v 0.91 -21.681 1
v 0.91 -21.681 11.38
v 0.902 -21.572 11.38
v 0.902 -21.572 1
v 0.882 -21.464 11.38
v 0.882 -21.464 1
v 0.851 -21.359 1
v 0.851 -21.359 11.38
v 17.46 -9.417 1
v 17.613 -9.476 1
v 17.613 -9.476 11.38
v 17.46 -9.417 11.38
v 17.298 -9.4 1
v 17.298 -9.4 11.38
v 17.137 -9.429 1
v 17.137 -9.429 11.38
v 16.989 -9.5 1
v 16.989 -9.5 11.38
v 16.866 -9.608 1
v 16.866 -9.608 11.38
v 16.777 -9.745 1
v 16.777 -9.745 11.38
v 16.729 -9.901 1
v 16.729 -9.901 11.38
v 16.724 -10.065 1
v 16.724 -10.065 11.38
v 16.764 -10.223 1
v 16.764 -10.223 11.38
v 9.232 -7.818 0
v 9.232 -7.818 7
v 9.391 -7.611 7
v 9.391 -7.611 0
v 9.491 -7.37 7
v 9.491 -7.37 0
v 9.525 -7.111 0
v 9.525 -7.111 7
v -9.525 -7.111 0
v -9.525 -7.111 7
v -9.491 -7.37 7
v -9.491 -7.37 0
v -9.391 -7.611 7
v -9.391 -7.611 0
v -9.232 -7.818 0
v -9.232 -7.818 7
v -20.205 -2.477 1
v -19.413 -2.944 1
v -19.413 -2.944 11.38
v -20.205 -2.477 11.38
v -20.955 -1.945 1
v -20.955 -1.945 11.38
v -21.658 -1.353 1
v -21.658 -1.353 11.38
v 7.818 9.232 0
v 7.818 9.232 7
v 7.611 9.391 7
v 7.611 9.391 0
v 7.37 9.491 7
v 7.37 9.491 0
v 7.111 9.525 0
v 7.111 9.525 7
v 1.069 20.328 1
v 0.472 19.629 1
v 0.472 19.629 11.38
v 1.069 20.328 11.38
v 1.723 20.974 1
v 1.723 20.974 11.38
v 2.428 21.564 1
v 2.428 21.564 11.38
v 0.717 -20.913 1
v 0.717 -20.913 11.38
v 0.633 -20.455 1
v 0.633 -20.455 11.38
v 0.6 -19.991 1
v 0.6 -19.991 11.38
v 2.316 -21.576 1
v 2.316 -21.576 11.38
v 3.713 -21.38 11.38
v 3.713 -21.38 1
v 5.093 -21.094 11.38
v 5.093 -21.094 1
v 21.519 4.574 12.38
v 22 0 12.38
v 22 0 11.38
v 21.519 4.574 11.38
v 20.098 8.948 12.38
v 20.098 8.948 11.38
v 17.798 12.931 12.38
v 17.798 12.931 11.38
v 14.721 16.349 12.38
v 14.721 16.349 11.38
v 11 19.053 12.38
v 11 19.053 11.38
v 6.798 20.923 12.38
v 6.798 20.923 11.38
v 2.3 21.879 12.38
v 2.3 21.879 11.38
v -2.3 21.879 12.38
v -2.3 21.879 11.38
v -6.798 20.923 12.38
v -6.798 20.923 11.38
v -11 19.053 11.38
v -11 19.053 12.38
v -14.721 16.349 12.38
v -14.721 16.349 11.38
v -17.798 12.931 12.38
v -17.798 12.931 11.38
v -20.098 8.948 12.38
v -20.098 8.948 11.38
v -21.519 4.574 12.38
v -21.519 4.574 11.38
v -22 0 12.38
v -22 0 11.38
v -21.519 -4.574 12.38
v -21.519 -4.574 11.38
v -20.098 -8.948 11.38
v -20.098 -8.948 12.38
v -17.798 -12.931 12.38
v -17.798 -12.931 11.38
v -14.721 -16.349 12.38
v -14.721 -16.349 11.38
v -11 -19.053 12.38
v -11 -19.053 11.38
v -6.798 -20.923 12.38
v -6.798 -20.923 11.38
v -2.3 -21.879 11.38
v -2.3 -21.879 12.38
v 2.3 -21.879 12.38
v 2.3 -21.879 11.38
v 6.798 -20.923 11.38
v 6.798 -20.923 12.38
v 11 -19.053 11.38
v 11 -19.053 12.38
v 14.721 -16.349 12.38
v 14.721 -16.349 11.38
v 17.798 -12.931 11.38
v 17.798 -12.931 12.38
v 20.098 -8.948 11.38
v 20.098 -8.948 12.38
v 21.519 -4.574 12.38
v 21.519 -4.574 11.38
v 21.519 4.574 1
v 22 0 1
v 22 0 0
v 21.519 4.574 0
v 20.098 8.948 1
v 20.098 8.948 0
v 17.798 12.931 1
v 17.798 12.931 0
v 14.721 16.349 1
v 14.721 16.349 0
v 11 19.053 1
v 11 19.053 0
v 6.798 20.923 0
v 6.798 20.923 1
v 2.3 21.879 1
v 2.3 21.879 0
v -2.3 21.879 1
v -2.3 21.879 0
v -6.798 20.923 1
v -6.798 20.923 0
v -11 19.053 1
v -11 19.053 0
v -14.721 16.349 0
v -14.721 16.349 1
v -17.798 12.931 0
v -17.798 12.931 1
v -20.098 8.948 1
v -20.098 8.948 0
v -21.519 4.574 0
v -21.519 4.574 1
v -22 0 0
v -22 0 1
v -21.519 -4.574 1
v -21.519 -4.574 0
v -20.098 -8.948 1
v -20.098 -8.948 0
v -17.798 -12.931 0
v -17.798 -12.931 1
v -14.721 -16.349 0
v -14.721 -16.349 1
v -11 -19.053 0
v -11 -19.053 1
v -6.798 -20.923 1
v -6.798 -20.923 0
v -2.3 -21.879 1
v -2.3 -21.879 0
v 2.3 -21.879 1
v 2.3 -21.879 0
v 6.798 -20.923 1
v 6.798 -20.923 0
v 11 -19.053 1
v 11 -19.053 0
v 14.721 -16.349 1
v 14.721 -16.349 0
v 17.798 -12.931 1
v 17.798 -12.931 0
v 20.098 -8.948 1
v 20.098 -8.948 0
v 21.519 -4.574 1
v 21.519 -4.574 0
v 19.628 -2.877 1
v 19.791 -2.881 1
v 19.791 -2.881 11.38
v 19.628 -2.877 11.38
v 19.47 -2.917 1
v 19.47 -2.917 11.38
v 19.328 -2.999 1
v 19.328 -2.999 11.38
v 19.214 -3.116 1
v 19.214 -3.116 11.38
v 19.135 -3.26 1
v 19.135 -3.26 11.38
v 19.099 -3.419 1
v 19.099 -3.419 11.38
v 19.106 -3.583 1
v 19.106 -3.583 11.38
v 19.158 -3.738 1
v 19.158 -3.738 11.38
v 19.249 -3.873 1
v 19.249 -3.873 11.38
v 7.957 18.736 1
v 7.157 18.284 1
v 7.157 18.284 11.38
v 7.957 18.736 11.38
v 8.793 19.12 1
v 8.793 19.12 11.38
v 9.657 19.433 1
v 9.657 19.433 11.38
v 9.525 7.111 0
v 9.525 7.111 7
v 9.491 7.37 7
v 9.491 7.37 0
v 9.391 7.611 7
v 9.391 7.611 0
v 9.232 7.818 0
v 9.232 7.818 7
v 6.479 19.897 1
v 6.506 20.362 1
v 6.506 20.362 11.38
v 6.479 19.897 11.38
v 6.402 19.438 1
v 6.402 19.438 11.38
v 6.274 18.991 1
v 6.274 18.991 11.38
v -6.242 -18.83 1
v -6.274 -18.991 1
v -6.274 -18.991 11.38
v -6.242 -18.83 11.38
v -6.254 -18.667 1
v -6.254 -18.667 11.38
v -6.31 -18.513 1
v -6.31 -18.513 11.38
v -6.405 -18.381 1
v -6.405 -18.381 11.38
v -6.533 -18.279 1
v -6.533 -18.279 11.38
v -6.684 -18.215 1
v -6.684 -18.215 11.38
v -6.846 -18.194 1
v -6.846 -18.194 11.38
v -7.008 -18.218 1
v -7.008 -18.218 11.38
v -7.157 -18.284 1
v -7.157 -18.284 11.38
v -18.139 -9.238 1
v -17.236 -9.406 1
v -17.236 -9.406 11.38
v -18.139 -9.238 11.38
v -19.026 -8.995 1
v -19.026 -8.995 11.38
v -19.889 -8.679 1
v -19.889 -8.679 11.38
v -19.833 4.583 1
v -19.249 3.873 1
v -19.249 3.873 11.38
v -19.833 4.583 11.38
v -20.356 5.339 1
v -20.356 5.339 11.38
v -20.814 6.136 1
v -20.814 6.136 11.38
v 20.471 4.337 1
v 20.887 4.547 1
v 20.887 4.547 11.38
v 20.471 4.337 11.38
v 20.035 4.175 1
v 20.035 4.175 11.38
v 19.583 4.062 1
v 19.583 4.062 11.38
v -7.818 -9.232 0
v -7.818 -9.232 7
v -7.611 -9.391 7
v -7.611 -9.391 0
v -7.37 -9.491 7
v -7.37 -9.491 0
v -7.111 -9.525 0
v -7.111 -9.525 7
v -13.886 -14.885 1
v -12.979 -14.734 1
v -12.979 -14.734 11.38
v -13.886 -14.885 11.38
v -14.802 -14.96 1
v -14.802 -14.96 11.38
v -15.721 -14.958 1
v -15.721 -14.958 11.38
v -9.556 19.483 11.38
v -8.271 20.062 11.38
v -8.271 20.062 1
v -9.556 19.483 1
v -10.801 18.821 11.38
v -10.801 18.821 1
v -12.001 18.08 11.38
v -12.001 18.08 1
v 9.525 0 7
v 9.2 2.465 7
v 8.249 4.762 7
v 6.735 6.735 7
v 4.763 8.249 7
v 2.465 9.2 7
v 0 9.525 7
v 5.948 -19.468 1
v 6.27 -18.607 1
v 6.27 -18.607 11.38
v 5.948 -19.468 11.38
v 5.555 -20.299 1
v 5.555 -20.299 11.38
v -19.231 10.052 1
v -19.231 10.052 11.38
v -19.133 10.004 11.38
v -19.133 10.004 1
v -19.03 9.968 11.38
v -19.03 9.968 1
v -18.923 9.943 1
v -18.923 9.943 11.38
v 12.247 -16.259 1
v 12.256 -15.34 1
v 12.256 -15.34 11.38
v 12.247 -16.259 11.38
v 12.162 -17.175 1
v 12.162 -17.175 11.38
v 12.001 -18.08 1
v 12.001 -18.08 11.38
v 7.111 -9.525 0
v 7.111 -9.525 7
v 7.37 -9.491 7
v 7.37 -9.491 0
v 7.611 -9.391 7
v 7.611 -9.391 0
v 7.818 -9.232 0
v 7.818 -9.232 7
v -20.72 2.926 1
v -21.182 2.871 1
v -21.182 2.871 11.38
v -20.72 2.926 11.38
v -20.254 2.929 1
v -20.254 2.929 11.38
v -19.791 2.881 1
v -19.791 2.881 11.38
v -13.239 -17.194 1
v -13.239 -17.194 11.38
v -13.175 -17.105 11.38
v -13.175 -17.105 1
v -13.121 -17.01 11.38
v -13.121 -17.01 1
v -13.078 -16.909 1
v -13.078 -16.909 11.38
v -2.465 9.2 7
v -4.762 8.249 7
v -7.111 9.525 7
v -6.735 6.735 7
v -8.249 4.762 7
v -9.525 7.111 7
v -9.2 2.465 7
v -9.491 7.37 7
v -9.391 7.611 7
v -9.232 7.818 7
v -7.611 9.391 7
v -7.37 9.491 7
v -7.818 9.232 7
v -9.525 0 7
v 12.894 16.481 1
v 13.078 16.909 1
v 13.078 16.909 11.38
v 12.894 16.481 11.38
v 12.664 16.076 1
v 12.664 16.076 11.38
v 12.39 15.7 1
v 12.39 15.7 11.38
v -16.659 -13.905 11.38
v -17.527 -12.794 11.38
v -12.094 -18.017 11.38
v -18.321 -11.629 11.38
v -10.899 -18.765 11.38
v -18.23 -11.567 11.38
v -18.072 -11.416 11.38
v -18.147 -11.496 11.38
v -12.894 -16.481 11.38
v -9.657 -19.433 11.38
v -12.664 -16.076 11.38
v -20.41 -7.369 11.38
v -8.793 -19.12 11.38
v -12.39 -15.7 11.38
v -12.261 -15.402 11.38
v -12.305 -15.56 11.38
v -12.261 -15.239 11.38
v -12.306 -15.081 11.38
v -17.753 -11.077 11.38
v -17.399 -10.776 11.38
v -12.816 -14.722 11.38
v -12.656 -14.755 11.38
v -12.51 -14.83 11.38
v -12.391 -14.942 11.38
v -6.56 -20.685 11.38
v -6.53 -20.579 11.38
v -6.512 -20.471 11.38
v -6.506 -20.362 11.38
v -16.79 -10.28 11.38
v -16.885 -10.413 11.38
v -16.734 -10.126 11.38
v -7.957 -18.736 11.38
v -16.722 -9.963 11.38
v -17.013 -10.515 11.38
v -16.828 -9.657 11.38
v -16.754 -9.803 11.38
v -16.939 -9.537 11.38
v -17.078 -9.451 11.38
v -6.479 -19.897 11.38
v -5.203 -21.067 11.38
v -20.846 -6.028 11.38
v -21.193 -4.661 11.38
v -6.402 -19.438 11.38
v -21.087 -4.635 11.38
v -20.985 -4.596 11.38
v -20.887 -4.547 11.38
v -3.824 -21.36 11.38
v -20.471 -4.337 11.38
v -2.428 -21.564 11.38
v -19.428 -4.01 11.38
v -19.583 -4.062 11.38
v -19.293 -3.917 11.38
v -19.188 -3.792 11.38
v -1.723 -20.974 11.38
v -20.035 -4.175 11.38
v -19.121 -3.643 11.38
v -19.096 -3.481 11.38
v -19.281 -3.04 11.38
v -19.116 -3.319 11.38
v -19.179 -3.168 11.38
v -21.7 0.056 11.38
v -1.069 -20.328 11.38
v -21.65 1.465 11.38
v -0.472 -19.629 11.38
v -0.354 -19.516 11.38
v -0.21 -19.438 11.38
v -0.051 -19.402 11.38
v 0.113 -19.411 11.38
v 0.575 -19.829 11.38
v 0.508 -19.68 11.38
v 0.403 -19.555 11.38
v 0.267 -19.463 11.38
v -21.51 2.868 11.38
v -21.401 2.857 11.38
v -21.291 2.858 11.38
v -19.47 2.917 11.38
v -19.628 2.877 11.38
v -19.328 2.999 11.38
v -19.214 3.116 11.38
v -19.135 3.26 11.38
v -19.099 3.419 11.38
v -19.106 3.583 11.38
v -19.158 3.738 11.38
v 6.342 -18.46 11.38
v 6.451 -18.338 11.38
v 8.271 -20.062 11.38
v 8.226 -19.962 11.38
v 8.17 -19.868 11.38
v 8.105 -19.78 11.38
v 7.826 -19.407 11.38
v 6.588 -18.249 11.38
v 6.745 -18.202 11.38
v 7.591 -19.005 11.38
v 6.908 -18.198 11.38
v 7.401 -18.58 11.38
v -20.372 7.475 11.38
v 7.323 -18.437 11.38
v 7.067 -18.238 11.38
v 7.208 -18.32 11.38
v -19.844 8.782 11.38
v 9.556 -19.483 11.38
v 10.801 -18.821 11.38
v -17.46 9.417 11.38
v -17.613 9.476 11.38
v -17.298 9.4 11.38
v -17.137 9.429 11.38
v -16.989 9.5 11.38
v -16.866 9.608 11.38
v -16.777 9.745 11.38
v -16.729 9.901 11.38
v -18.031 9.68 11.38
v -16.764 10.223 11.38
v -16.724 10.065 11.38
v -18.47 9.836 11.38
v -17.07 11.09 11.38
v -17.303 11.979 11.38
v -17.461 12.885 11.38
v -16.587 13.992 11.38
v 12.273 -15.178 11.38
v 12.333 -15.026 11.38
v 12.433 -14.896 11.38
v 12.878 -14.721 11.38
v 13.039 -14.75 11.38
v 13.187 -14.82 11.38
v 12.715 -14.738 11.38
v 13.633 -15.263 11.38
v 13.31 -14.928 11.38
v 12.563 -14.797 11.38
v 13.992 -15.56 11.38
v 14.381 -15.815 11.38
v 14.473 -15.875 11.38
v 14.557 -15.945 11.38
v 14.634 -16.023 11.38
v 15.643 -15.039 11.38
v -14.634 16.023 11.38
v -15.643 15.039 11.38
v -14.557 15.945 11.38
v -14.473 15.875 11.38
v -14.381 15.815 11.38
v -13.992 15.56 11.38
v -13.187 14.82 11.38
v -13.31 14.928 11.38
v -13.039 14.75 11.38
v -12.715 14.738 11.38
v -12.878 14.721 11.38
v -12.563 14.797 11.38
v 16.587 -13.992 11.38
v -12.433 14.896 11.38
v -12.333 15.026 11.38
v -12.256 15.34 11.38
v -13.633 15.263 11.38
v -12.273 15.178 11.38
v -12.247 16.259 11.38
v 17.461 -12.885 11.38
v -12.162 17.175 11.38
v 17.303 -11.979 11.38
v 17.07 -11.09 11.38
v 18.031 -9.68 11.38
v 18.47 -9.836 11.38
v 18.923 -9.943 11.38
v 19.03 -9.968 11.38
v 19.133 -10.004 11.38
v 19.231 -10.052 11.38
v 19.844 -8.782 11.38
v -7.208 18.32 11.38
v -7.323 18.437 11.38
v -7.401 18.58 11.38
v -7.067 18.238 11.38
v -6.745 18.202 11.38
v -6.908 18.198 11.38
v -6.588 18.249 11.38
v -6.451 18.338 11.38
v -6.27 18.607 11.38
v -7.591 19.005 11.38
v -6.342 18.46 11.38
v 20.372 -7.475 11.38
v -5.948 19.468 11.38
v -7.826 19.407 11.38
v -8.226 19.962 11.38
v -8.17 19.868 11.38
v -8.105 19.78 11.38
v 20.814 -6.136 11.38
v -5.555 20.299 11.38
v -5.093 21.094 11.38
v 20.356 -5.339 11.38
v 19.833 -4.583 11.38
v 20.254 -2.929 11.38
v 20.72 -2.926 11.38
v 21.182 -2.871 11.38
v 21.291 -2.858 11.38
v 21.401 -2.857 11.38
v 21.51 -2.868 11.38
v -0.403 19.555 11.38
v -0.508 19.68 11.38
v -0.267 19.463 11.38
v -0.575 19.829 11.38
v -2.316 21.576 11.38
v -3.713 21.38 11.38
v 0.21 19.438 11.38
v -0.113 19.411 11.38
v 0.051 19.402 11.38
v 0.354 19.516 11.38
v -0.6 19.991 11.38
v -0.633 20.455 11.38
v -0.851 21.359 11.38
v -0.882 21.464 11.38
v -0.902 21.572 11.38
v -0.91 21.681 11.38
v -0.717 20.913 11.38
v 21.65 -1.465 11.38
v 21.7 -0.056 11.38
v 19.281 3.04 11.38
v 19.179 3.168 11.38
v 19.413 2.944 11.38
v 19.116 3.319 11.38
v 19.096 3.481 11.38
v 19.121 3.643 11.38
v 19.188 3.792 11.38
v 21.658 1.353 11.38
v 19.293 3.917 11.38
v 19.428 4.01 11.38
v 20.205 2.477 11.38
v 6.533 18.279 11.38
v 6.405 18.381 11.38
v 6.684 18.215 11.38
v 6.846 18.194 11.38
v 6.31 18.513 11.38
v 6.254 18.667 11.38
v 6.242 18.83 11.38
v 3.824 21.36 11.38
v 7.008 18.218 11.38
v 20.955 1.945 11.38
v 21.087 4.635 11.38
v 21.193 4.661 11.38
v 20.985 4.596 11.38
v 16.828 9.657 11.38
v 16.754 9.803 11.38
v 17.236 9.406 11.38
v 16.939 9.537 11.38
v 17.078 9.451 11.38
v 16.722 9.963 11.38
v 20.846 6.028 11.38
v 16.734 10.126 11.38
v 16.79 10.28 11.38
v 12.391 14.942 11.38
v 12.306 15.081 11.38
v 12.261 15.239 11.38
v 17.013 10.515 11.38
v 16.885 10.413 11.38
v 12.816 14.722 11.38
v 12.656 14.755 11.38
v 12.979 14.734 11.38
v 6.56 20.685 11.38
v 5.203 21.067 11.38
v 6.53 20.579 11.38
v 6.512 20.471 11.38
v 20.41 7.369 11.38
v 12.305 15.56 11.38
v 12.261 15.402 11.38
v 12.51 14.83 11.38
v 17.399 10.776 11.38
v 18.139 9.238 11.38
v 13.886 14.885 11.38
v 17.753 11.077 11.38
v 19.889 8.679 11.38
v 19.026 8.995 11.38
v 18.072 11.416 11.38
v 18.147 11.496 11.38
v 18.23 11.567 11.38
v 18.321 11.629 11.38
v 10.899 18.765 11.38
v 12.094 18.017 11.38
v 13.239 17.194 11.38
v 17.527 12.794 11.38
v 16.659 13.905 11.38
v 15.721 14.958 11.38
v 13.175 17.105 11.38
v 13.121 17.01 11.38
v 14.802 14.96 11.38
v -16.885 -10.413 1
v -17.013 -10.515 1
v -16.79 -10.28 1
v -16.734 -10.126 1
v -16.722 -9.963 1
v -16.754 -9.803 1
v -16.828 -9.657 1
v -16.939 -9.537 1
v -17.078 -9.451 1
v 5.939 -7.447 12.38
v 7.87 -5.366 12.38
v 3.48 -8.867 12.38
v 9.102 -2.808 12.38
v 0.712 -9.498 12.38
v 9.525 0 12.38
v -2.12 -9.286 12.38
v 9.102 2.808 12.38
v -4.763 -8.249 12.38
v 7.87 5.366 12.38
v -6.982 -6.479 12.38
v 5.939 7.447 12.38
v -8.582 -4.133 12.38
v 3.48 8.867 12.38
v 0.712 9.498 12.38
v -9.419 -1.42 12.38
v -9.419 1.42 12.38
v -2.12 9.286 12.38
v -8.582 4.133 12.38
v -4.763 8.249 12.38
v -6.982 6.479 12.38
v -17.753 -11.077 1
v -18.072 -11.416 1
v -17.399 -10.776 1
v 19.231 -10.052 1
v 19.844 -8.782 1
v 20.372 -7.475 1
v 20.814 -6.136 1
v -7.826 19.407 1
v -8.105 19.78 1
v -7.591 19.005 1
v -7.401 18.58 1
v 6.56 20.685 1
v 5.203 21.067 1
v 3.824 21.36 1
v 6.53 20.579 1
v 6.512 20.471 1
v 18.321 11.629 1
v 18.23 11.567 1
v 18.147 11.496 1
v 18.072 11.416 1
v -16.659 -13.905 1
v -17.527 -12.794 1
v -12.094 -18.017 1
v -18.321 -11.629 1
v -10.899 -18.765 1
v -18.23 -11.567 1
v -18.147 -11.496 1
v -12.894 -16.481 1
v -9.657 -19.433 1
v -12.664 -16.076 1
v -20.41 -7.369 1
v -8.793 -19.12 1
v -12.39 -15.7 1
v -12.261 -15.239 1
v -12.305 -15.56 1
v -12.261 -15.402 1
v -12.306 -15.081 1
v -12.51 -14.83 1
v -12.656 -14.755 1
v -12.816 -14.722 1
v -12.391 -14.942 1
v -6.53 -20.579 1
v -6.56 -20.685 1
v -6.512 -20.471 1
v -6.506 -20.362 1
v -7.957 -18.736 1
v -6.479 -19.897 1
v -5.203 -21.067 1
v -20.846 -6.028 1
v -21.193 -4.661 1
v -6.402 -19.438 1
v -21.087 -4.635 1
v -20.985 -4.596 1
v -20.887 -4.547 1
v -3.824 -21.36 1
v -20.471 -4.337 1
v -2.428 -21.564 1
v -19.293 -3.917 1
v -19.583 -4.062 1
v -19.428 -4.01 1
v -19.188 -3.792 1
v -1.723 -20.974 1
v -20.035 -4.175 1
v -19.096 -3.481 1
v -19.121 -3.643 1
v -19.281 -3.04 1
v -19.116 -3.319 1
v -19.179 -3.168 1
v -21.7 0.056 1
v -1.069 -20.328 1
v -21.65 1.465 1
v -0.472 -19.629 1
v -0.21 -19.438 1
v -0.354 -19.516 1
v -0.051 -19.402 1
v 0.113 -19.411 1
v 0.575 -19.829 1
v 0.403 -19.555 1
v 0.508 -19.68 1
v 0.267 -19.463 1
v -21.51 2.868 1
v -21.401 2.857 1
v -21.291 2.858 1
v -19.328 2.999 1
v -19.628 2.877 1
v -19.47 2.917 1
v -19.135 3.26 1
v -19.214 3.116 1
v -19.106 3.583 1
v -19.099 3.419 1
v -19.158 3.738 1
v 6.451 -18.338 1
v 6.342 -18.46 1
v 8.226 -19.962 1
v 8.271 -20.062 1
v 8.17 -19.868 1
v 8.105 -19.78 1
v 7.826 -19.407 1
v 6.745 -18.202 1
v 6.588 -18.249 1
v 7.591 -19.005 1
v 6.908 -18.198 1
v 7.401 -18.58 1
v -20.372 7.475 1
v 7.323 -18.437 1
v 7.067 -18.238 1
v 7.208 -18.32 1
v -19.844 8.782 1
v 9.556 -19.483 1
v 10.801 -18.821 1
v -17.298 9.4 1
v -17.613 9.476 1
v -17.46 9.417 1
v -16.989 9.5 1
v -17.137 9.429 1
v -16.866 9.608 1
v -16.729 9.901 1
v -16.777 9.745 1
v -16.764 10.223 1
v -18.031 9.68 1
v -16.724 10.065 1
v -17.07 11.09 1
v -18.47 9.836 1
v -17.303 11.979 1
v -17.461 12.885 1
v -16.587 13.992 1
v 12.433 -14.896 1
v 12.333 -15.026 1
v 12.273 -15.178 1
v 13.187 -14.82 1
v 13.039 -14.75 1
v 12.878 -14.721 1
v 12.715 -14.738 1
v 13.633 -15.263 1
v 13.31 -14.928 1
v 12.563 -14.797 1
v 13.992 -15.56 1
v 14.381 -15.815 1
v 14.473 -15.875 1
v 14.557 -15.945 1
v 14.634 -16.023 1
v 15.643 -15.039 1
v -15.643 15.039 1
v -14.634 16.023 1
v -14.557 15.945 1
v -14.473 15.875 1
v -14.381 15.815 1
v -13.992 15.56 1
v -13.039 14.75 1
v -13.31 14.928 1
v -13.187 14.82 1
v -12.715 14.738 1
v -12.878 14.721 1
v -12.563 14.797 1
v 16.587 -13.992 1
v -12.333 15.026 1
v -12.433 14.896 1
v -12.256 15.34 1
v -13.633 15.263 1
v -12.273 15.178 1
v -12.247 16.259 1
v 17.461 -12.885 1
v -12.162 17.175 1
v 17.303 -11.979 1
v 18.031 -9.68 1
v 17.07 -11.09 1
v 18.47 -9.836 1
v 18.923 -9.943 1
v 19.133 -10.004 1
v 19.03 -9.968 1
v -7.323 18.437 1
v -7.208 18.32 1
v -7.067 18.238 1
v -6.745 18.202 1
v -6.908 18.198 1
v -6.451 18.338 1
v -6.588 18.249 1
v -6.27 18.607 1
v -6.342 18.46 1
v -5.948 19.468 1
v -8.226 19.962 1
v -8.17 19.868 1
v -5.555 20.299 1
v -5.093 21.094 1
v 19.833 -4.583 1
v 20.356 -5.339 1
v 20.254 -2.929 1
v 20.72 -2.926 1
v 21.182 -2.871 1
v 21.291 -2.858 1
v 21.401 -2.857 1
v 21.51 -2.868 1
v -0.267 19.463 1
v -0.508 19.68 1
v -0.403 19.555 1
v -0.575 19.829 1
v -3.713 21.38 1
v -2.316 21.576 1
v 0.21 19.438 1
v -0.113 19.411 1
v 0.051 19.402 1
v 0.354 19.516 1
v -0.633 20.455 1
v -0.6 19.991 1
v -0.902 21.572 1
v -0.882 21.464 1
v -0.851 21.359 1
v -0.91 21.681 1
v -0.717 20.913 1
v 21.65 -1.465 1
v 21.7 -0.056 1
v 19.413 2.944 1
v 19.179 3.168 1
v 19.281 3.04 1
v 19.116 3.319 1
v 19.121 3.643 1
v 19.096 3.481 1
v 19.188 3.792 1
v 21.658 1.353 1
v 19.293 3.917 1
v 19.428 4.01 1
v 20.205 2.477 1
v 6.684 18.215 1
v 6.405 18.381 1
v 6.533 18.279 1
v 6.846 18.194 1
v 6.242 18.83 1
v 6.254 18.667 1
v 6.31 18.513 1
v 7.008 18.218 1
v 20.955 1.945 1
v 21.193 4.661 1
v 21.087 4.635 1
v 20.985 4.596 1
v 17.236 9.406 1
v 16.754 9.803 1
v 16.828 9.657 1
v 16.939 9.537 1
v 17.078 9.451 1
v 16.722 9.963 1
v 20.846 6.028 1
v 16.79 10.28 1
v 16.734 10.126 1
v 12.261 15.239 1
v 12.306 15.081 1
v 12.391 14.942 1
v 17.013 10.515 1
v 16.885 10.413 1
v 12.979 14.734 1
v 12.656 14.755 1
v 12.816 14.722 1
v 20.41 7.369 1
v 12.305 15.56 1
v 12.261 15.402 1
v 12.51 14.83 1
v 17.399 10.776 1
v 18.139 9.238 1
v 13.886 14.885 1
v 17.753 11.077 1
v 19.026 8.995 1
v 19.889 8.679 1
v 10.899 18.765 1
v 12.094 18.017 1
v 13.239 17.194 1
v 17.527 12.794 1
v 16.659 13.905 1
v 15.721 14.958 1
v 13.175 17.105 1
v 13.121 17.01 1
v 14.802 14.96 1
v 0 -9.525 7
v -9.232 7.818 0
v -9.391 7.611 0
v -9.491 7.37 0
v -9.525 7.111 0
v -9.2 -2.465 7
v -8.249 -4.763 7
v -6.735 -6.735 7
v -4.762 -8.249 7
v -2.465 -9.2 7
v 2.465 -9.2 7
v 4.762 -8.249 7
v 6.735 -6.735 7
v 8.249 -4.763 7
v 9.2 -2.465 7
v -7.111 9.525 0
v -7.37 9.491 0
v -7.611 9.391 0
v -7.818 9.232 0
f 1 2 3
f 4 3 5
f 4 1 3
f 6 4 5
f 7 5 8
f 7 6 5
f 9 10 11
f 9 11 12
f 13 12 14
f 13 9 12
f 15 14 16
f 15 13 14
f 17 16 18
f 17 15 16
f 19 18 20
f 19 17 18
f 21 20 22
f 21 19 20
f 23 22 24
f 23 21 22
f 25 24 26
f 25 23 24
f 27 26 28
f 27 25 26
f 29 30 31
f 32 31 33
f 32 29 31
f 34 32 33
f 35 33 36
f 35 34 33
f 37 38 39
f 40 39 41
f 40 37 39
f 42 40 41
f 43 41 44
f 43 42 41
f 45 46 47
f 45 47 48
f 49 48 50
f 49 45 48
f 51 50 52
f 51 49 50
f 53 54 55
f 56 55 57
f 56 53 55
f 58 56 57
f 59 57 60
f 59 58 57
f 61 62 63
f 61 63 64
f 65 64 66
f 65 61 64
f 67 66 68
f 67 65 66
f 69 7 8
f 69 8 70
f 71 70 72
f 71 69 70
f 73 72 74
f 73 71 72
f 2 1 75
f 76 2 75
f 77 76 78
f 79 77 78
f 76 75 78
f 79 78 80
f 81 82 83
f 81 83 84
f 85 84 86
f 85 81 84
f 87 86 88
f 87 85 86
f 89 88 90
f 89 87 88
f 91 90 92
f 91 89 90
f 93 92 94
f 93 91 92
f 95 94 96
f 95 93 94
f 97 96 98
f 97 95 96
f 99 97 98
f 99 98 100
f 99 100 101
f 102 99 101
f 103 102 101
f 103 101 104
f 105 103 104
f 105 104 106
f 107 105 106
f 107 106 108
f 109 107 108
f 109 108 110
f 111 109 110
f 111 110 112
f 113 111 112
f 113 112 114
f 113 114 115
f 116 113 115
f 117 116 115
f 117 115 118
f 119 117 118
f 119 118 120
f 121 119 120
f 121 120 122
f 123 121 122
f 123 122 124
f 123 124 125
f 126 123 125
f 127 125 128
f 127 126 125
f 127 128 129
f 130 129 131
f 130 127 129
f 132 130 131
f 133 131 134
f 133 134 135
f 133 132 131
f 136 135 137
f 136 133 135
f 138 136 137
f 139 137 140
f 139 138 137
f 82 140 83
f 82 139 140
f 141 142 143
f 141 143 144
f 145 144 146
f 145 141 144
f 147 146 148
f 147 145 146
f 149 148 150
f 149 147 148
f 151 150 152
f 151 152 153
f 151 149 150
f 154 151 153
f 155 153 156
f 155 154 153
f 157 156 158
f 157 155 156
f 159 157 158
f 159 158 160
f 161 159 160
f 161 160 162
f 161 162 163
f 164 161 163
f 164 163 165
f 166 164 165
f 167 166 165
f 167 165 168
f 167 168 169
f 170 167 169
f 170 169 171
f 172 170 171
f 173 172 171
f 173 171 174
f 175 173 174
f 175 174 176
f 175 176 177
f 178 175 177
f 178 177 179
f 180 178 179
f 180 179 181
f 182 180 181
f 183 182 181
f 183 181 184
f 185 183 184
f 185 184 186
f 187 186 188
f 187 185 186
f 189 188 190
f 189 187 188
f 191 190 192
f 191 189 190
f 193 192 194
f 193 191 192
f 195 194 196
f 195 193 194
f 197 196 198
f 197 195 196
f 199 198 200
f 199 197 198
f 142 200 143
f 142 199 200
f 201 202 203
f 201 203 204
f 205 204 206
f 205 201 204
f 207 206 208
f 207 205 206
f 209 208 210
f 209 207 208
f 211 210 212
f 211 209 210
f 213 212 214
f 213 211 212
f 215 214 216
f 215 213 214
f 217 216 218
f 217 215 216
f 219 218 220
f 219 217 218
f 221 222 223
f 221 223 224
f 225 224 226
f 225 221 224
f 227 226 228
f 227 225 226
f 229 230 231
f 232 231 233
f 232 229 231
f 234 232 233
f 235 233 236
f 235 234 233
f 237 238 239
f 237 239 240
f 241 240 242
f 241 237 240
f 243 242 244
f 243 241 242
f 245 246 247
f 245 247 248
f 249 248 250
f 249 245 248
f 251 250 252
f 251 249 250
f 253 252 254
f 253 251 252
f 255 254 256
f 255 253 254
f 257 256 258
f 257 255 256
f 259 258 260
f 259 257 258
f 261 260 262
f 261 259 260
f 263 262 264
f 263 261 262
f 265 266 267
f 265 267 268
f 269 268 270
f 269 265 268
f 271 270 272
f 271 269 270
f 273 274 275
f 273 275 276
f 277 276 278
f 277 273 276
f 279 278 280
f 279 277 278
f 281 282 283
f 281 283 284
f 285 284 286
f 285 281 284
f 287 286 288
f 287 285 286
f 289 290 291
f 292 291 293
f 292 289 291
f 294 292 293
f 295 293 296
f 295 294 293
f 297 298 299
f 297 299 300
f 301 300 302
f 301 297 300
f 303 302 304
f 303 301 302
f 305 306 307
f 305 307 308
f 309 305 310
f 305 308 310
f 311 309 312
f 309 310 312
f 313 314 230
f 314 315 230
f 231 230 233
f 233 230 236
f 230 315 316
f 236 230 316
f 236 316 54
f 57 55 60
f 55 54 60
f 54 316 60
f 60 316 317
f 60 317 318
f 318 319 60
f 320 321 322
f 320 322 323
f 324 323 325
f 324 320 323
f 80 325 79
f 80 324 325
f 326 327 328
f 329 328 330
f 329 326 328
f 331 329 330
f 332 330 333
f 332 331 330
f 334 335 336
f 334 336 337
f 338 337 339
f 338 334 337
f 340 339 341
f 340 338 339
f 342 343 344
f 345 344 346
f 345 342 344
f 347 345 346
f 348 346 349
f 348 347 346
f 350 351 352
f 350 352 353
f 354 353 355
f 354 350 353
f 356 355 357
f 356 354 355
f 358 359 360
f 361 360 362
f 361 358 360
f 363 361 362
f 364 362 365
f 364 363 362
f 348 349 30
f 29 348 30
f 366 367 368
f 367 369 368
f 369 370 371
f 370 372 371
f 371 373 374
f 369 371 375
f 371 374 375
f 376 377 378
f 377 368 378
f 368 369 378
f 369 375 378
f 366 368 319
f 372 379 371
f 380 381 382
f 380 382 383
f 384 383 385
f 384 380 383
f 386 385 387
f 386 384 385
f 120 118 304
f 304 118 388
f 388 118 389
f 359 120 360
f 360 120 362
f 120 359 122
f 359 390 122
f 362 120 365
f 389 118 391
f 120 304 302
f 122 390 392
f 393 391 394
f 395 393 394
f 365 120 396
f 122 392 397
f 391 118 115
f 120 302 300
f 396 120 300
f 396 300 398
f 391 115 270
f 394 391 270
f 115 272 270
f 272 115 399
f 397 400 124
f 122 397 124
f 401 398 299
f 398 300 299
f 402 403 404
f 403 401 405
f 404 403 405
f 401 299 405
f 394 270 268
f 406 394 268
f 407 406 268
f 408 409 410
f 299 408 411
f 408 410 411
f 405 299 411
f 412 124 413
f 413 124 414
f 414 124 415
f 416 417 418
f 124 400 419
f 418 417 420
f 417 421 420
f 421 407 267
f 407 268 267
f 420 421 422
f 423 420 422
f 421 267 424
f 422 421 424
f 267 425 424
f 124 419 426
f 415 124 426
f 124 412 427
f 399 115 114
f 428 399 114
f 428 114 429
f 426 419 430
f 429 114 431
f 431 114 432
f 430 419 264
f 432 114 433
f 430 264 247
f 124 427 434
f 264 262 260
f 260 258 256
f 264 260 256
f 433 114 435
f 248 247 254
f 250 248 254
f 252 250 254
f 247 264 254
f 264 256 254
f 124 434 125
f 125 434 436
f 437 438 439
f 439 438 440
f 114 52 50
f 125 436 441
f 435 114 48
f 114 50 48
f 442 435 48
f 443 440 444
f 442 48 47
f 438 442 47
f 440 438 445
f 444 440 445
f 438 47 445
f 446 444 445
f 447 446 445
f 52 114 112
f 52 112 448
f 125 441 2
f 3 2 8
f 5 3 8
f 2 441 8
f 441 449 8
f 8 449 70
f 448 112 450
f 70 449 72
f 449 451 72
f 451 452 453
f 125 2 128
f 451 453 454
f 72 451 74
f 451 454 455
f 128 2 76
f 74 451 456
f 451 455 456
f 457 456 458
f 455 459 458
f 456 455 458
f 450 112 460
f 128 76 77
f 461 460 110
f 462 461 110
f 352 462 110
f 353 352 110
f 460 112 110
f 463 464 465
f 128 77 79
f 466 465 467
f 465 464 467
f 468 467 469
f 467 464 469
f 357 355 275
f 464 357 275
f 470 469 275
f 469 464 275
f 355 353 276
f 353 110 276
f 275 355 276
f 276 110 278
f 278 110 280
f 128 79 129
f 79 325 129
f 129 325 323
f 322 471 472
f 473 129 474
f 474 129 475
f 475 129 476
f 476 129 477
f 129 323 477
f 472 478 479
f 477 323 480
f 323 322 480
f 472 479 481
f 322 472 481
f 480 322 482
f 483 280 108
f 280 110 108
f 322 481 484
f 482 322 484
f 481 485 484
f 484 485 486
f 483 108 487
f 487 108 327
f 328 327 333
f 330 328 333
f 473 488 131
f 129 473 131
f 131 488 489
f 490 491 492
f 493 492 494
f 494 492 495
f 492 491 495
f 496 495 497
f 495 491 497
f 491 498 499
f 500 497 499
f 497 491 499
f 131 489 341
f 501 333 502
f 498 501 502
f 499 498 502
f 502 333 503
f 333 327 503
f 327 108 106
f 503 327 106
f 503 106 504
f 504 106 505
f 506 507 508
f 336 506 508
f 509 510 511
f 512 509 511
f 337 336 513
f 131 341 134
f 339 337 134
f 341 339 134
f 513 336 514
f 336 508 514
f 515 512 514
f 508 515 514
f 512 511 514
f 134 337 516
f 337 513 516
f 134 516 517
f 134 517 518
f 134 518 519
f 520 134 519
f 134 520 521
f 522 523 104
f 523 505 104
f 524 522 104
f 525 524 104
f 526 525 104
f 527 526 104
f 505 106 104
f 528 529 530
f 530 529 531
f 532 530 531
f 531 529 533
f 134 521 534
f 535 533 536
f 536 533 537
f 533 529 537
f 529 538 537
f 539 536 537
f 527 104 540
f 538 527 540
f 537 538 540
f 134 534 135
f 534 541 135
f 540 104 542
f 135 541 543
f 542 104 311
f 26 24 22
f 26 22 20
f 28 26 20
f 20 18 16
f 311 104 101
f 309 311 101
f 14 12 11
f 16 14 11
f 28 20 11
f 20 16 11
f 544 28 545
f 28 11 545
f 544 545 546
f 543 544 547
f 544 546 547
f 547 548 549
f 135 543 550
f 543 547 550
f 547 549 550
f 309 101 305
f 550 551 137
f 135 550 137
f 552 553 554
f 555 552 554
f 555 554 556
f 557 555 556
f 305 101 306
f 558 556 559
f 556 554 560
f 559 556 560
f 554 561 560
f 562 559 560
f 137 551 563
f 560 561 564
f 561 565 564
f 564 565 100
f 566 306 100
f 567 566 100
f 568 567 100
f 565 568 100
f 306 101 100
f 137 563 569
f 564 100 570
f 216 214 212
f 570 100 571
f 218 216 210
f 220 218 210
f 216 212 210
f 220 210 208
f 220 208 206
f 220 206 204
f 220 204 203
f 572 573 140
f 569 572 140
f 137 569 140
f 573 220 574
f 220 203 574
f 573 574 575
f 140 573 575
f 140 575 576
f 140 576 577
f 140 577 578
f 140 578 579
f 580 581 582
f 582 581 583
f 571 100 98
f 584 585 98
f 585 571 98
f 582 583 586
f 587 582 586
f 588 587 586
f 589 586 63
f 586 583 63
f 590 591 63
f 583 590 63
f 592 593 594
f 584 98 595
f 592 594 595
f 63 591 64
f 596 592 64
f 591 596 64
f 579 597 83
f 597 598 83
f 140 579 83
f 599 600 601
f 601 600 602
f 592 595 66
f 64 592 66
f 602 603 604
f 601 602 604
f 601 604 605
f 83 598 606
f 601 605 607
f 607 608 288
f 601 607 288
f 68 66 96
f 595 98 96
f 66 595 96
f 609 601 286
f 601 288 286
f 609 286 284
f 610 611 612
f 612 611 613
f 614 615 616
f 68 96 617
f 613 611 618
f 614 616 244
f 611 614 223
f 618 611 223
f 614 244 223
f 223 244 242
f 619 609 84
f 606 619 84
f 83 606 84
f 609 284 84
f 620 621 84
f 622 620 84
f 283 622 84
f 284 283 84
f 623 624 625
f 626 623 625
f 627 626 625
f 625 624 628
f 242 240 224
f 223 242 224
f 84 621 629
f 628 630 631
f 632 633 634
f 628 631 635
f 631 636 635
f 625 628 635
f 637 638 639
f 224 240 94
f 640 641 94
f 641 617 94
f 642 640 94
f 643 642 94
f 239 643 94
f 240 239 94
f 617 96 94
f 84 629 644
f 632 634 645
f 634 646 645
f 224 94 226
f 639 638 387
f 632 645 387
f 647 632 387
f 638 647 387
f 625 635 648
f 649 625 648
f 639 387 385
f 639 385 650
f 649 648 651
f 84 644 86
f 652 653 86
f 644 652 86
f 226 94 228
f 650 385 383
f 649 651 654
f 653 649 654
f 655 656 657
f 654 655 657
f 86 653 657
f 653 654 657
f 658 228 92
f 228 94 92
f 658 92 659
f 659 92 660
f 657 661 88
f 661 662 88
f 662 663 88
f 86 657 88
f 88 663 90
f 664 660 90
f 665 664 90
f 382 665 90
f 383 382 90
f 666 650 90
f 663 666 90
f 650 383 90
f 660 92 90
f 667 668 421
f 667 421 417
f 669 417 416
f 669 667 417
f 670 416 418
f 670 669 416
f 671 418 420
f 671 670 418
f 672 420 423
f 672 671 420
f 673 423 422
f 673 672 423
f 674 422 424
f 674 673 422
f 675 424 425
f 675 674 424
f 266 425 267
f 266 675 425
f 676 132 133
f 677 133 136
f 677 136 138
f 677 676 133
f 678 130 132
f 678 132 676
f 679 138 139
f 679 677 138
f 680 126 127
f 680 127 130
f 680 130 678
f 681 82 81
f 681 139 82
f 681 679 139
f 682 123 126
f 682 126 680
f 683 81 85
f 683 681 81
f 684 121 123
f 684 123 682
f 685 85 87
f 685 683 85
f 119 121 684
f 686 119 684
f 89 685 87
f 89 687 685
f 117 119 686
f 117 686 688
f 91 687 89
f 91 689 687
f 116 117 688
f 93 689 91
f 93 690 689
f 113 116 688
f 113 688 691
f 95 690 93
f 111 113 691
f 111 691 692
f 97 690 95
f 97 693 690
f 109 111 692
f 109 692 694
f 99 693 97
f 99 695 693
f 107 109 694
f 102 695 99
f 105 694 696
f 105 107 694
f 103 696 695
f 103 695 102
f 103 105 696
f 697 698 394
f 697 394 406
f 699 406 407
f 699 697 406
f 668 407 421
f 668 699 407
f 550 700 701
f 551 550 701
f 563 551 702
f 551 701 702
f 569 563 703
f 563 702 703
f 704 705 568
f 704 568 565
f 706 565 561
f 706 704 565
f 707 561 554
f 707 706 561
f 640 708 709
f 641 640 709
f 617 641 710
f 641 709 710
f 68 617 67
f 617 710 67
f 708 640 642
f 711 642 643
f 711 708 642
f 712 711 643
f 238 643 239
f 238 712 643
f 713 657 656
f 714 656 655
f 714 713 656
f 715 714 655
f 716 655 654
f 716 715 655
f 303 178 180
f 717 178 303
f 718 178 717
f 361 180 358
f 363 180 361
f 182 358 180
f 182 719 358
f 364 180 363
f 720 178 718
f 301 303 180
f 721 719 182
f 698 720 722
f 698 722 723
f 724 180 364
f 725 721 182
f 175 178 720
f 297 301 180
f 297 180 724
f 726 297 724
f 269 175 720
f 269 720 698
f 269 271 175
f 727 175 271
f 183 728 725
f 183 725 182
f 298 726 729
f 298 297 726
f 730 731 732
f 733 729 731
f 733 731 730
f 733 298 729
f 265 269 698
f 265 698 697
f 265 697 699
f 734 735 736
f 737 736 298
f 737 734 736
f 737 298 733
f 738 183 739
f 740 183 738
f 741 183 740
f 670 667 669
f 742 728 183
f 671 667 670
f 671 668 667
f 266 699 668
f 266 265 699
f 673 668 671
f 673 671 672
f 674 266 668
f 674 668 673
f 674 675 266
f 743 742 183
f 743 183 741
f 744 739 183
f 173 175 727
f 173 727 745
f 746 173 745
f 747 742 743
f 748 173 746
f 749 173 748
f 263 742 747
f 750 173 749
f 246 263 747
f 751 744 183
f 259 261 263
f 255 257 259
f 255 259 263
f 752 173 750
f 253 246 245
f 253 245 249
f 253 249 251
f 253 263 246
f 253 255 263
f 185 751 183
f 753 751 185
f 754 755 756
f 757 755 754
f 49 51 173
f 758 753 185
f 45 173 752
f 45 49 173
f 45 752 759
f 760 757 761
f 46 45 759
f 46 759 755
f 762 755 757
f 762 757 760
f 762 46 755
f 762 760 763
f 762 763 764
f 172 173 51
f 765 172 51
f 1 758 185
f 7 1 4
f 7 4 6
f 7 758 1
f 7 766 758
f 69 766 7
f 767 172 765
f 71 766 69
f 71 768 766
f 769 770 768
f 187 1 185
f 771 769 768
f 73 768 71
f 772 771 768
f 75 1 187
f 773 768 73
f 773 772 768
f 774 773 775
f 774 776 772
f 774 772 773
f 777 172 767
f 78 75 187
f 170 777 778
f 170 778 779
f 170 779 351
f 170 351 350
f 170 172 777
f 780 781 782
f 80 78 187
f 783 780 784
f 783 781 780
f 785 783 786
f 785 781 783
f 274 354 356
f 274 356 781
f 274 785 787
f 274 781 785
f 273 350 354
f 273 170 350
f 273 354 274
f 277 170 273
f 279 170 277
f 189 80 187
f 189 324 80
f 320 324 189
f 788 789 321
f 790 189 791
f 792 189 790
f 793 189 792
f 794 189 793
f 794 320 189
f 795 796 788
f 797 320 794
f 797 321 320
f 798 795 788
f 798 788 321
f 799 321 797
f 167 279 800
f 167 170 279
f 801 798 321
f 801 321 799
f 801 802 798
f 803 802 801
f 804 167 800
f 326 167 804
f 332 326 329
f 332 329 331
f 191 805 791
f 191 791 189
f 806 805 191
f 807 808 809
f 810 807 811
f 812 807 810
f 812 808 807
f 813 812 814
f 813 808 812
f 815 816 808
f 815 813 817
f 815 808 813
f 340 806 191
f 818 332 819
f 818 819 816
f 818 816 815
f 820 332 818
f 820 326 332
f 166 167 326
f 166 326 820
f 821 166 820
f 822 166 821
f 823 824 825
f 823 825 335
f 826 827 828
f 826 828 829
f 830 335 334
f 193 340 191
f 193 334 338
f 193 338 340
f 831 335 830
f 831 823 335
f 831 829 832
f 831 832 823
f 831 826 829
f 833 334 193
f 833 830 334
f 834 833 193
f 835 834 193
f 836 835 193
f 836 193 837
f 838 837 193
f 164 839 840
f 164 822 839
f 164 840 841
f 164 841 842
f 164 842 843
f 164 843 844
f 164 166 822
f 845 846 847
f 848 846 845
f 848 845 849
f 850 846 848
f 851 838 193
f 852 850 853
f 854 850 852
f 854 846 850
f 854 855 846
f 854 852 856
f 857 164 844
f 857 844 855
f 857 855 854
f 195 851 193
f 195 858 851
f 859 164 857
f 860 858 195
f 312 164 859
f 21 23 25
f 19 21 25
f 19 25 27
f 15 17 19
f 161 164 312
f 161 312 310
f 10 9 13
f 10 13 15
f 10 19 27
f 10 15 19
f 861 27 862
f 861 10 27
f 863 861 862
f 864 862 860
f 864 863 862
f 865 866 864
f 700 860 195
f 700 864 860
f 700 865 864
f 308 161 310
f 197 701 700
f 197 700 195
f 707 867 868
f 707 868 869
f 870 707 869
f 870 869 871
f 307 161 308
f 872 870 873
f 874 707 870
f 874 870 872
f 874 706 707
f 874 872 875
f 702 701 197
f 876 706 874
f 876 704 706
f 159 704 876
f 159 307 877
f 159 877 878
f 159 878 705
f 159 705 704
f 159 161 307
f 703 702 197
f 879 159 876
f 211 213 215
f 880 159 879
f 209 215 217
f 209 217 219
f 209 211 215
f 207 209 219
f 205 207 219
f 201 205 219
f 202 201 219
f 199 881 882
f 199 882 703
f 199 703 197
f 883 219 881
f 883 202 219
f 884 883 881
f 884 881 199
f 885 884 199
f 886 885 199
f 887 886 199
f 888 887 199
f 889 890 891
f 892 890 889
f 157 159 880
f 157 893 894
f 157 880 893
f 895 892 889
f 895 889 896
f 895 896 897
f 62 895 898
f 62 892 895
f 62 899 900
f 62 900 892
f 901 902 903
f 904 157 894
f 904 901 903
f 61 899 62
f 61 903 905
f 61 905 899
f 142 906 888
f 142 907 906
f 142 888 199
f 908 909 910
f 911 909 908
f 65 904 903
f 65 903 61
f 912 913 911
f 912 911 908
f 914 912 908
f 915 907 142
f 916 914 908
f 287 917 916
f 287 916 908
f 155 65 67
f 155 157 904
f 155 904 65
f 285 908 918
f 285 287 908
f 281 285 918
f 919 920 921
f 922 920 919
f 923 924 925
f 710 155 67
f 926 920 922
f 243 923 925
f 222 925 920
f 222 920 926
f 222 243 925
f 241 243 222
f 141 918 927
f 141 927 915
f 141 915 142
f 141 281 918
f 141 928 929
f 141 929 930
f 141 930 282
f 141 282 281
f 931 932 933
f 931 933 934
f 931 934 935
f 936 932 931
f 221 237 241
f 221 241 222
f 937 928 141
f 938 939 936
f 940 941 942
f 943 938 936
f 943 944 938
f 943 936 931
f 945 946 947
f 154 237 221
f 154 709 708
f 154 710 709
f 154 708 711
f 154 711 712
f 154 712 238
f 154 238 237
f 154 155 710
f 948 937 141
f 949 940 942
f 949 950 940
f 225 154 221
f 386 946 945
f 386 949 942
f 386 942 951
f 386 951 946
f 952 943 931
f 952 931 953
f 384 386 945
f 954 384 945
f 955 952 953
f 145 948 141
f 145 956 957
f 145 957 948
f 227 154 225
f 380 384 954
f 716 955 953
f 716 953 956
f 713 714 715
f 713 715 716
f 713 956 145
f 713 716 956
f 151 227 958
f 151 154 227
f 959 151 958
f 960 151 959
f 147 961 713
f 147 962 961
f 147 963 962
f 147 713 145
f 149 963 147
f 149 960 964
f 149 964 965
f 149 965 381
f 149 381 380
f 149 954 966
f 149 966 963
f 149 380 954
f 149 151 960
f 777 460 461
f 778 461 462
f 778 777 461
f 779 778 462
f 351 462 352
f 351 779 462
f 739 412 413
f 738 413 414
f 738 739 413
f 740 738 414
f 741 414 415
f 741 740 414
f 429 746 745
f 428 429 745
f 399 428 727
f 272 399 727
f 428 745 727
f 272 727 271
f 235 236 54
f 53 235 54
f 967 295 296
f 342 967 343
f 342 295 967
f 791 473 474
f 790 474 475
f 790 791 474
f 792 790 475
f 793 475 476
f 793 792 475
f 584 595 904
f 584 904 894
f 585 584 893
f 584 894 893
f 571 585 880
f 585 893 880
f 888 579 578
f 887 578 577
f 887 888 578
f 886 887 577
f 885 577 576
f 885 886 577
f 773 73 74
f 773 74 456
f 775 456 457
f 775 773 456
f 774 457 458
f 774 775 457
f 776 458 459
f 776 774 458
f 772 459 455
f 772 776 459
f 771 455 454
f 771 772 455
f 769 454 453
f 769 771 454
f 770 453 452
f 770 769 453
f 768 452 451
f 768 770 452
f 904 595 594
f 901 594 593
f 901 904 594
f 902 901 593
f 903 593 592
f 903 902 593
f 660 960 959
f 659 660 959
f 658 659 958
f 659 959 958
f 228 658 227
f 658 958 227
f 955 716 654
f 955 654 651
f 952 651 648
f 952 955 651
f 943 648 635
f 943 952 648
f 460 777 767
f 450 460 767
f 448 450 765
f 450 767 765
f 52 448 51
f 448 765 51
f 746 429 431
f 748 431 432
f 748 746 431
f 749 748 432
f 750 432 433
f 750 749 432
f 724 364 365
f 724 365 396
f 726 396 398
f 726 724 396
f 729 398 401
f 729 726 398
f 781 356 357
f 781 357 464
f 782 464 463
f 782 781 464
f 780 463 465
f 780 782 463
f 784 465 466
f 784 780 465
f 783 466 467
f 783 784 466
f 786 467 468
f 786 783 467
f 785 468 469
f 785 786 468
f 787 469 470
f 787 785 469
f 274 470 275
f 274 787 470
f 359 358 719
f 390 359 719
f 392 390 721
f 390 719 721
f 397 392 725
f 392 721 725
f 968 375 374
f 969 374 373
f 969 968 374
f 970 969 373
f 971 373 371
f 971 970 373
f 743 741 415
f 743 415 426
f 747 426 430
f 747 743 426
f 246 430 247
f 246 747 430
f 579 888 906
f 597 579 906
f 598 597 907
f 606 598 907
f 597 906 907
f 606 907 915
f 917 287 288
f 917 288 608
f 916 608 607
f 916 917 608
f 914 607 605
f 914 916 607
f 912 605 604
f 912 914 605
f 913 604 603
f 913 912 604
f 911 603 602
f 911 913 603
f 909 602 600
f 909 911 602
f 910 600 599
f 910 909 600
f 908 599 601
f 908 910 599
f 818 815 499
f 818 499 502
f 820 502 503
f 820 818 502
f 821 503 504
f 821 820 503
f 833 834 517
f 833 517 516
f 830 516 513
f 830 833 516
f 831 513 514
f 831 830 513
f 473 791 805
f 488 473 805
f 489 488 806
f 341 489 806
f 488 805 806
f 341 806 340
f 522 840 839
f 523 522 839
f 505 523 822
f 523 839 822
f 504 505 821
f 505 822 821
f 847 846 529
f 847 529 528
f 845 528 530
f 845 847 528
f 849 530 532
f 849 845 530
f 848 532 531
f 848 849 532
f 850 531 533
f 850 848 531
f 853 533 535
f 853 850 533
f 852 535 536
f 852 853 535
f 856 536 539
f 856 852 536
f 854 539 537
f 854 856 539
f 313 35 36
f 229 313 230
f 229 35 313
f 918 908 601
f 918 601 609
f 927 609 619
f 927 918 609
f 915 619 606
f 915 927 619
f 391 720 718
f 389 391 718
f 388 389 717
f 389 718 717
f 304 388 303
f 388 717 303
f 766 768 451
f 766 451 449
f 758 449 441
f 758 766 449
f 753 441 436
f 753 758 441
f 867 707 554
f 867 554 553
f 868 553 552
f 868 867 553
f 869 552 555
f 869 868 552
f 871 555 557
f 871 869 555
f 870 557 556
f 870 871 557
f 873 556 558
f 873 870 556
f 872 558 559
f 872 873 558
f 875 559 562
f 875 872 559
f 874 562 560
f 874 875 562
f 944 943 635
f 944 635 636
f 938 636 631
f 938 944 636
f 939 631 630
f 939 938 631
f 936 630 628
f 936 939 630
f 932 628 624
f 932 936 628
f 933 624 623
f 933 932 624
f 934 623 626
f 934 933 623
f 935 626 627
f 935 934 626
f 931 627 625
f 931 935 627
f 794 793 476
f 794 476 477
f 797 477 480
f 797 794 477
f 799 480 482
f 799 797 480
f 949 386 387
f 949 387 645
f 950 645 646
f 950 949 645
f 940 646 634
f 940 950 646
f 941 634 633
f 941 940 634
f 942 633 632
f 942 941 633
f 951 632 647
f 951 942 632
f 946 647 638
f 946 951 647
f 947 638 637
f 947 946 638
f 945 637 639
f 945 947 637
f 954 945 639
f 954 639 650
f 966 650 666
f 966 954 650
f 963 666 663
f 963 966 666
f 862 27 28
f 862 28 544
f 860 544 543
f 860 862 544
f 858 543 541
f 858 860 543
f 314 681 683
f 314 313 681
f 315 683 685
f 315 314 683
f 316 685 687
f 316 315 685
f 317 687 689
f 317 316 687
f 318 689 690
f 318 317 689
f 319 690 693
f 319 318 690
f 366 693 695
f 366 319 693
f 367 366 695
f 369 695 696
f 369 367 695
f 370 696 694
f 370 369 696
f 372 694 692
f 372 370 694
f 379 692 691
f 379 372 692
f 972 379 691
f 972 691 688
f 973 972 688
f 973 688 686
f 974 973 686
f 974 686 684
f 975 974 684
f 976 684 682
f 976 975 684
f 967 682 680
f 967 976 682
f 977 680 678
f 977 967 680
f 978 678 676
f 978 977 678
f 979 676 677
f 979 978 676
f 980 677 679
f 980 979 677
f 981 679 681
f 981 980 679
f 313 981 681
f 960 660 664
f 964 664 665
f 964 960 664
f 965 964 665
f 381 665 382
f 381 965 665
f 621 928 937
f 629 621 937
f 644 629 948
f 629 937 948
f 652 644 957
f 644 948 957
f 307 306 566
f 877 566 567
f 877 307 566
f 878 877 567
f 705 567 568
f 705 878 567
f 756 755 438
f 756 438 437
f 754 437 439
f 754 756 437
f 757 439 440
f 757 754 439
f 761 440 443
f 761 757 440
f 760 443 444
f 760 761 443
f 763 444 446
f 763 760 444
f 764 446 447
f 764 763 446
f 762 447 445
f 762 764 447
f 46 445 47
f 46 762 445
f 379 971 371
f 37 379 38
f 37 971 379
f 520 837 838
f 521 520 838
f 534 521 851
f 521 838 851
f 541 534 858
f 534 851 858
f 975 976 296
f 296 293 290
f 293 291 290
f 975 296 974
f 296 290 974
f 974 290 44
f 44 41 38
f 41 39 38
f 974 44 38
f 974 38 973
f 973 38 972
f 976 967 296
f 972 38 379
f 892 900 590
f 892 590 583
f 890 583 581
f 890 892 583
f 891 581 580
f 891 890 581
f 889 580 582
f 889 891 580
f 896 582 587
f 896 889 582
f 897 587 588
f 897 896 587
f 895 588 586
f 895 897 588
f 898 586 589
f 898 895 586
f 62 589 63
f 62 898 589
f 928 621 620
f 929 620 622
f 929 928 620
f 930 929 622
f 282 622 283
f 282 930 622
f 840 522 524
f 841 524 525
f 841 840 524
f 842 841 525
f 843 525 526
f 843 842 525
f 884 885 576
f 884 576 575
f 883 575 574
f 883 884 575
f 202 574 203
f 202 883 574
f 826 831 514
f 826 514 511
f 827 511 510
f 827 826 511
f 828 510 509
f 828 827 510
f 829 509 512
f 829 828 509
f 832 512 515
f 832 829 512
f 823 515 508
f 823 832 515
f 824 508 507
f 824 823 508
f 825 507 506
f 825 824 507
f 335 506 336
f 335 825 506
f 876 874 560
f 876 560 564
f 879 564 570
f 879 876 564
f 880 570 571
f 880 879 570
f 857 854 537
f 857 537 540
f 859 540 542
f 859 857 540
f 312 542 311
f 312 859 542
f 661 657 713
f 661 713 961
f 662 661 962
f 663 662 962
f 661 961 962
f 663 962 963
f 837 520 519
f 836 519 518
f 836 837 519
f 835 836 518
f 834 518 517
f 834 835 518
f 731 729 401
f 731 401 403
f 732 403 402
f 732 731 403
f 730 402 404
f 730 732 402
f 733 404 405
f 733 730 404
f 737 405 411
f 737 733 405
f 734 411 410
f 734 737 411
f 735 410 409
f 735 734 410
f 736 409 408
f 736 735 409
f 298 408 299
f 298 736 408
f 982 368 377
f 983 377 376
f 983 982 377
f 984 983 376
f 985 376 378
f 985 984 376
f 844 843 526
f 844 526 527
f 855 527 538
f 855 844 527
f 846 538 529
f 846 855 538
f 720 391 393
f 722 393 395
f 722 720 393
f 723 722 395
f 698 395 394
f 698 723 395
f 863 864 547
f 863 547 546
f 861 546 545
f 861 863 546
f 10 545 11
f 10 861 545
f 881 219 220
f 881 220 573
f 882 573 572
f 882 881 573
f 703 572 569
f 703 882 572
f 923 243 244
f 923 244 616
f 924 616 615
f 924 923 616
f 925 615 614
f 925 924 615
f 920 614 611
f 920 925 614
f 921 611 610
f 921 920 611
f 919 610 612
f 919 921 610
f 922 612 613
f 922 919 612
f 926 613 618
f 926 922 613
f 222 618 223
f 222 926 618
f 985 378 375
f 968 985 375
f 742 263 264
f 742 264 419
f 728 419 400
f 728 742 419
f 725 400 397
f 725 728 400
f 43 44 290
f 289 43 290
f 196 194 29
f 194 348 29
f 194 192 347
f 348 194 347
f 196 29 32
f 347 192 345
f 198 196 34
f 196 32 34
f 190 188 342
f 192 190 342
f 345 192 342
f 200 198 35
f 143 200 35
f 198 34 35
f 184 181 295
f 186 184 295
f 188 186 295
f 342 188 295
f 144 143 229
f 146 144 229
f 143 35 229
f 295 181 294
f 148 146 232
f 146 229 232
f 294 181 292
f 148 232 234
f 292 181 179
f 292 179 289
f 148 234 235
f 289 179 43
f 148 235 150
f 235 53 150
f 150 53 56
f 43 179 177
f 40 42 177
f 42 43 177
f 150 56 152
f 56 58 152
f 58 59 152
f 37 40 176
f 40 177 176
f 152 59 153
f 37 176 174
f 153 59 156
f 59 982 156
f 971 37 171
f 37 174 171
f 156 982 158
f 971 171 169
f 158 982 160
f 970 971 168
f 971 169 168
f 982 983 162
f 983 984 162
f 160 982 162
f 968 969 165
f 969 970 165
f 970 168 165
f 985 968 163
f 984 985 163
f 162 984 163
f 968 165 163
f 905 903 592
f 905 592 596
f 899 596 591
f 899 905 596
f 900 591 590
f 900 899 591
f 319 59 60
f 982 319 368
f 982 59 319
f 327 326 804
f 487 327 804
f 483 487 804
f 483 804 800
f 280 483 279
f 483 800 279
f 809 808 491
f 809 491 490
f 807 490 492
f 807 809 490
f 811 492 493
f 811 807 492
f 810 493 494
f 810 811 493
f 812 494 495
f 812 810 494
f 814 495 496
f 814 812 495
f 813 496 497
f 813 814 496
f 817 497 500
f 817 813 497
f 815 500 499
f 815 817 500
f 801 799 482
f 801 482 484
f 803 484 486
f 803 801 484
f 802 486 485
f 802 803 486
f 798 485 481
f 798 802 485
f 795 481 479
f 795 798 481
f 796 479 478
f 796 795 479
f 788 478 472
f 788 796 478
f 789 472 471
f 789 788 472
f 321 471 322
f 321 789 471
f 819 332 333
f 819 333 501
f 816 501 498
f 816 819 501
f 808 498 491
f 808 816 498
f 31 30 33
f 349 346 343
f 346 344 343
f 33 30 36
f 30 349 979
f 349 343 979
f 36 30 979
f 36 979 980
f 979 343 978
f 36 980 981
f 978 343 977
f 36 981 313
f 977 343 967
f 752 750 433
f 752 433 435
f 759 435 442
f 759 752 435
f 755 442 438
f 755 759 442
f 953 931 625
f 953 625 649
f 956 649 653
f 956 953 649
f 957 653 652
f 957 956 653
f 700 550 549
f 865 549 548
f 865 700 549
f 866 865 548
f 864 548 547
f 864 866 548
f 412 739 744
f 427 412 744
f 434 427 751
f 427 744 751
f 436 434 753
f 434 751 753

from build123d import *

# Parameters (mm, degrees)
SKETCH1_R             = 25
BOSS_EXTRUDE1_DEPTH   = 12.38
BOSS_EXTRUDE4_START   = -5.38
SKETCH9_R             = 25
SKETCH9_R_2           = 9.525
BOSS_EXTRUDE4_DEPTH   = 5.38
SKETCH4_OUTSIDE_W     = 66.358
SKETCH4_OUTSIDE_H     = 66.358
SKETCH4_OUTSIDE_R     = 22
TREAD_CLEARANCE_DEPTH = 38.460170849
CUT_EXTRUDE2_START    = 1
SKETCH5_OUTSIDE_W     = 58.688
SKETCH5_OUTSIDE_H     = 58.688
SKETCH5_OUTSIDE_R     = 21.7
CUT_EXTRUDE2_DEPTH    = 10.38
CUT_EXTRUDE3_DEPTH    = 10.38
CIRPATTERN4_COUNT     = 18


with BuildPart() as part:
    # Sketch1 → Boss-Extrude1 (new body)
    with BuildSketch(Plane.XY):
        with Locations(Location((0, 0, 0), (0, 0, 90))):
            Circle(SKETCH1_R)
        with BuildLine():
            Line((9.525, -7.110786438), (9.525, 7.110786438))
            ThreePointArc((9.525, 7.110786438), (9.448879533, 7.49346987), (9.232106781, 7.817893219))
            Line((9.232106781, 7.817893219), (7.817893219, 9.232106781))
            ThreePointArc((7.817893219, 9.232106781), (7.49346987, 9.448879533), (7.110786438, 9.525))
            Line((7.110786438, 9.525), (-7.110786438, 9.525))
            ThreePointArc((-7.110786438, 9.525), (-7.49346987, 9.448879533), (-7.817893219, 9.232106781))
            Line((-7.817893219, 9.232106781), (-9.232106781, 7.817893219))
            ThreePointArc((-9.232106781, 7.817893219), (-9.448879533, 7.49346987), (-9.525, 7.110786438))
            Line((-9.525, 7.110786438), (-9.525, -7.110786438))
            ThreePointArc((-9.525, -7.110786438), (-9.448879533, -7.49346987), (-9.232106781, -7.817893219))
            Line((-9.232106781, -7.817893219), (-7.817893219, -9.232106781))
            ThreePointArc((-7.817893219, -9.232106781), (-7.49346987, -9.448879533), (-7.110786438, -9.525))
            Line((-7.110786438, -9.525), (7.110786438, -9.525))
            ThreePointArc((7.110786438, -9.525), (7.49346987, -9.448879533), (7.817893219, -9.232106781))
            Line((7.817893219, -9.232106781), (9.232106781, -7.817893219))
            ThreePointArc((9.232106781, -7.817893219), (9.448879533, -7.49346987), (9.525, -7.110786438))
        make_face(mode=Mode.SUBTRACT)
    extrude(amount=BOSS_EXTRUDE1_DEPTH)

    # Sketch9 → Boss-Extrude4 (add)
    with BuildSketch(Plane.XY.offset(12.38).offset(BOSS_EXTRUDE4_START)):
        with Locations(Location((0, 0, 0), (0, 0, 90))):
            Circle(SKETCH9_R)
        Circle(SKETCH9_R_2, mode=Mode.SUBTRACT)
    extrude(amount=BOSS_EXTRUDE4_DEPTH)

    # Sketch4 outside → Tread Clearance (cut, through all)
    with BuildSketch(Plane.XY.offset(12.38)):
        Rectangle(SKETCH4_OUTSIDE_W, SKETCH4_OUTSIDE_H)
        Circle(SKETCH4_OUTSIDE_R, mode=Mode.SUBTRACT)
    extrude(amount=-TREAD_CLEARANCE_DEPTH, mode=Mode.SUBTRACT)

    # Sketch5 outside → Cut-Extrude2 (cut)
    with BuildSketch(Plane.XY.offset(CUT_EXTRUDE2_START)):
        Rectangle(SKETCH5_OUTSIDE_W, SKETCH5_OUTSIDE_H)
        with Locations(Location((0, 0, 0), (0, 0, 90))):
            Circle(SKETCH5_OUTSIDE_R, mode=Mode.SUBTRACT)
    extrude(amount=CUT_EXTRUDE2_DEPTH, mode=Mode.SUBTRACT)

    # Sketch6 → Cut-Extrude3 (cut)
    with BuildSketch(Plane.XY.offset(1)):
        with BuildLine():
            ThreePointArc((6.505756366, 20.361958768), (6.446827822, 19.666593295), (6.273572546, 18.99058418))
            ThreePointArc((6.273572546, 18.99058418), (6.465736016, 18.325211027), (7.157089189, 18.284235134))
            ThreePointArc((7.157089189, 18.284235134), (8.371042068, 18.936944495), (9.657089189, 19.432720561))
            ThreePointArc((9.657089189, 19.432720561), (8.132554572, 20.118438213), (6.559758729, 20.684766506))
            ThreePointArc((6.559758729, 20.684766506), (6.519461312, 20.525586959), (6.505756366, 20.361958768))
        make_face()
    cut_extrude3 = extrude(amount=CUT_EXTRUDE3_DEPTH, mode=Mode.SUBTRACT)

    # CirPattern4: Cut-Extrude3 ×18 about axis
    cirpattern4_axis = Axis((0, 0, 0), (0, 0, 1))
    for i in range(1, CIRPATTERN4_COUNT):
        add(cut_extrude3.rotate(cirpattern4_axis, i * 360 / CIRPATTERN4_COUNT), mode=Mode.SUBTRACT)


solid = part.part
